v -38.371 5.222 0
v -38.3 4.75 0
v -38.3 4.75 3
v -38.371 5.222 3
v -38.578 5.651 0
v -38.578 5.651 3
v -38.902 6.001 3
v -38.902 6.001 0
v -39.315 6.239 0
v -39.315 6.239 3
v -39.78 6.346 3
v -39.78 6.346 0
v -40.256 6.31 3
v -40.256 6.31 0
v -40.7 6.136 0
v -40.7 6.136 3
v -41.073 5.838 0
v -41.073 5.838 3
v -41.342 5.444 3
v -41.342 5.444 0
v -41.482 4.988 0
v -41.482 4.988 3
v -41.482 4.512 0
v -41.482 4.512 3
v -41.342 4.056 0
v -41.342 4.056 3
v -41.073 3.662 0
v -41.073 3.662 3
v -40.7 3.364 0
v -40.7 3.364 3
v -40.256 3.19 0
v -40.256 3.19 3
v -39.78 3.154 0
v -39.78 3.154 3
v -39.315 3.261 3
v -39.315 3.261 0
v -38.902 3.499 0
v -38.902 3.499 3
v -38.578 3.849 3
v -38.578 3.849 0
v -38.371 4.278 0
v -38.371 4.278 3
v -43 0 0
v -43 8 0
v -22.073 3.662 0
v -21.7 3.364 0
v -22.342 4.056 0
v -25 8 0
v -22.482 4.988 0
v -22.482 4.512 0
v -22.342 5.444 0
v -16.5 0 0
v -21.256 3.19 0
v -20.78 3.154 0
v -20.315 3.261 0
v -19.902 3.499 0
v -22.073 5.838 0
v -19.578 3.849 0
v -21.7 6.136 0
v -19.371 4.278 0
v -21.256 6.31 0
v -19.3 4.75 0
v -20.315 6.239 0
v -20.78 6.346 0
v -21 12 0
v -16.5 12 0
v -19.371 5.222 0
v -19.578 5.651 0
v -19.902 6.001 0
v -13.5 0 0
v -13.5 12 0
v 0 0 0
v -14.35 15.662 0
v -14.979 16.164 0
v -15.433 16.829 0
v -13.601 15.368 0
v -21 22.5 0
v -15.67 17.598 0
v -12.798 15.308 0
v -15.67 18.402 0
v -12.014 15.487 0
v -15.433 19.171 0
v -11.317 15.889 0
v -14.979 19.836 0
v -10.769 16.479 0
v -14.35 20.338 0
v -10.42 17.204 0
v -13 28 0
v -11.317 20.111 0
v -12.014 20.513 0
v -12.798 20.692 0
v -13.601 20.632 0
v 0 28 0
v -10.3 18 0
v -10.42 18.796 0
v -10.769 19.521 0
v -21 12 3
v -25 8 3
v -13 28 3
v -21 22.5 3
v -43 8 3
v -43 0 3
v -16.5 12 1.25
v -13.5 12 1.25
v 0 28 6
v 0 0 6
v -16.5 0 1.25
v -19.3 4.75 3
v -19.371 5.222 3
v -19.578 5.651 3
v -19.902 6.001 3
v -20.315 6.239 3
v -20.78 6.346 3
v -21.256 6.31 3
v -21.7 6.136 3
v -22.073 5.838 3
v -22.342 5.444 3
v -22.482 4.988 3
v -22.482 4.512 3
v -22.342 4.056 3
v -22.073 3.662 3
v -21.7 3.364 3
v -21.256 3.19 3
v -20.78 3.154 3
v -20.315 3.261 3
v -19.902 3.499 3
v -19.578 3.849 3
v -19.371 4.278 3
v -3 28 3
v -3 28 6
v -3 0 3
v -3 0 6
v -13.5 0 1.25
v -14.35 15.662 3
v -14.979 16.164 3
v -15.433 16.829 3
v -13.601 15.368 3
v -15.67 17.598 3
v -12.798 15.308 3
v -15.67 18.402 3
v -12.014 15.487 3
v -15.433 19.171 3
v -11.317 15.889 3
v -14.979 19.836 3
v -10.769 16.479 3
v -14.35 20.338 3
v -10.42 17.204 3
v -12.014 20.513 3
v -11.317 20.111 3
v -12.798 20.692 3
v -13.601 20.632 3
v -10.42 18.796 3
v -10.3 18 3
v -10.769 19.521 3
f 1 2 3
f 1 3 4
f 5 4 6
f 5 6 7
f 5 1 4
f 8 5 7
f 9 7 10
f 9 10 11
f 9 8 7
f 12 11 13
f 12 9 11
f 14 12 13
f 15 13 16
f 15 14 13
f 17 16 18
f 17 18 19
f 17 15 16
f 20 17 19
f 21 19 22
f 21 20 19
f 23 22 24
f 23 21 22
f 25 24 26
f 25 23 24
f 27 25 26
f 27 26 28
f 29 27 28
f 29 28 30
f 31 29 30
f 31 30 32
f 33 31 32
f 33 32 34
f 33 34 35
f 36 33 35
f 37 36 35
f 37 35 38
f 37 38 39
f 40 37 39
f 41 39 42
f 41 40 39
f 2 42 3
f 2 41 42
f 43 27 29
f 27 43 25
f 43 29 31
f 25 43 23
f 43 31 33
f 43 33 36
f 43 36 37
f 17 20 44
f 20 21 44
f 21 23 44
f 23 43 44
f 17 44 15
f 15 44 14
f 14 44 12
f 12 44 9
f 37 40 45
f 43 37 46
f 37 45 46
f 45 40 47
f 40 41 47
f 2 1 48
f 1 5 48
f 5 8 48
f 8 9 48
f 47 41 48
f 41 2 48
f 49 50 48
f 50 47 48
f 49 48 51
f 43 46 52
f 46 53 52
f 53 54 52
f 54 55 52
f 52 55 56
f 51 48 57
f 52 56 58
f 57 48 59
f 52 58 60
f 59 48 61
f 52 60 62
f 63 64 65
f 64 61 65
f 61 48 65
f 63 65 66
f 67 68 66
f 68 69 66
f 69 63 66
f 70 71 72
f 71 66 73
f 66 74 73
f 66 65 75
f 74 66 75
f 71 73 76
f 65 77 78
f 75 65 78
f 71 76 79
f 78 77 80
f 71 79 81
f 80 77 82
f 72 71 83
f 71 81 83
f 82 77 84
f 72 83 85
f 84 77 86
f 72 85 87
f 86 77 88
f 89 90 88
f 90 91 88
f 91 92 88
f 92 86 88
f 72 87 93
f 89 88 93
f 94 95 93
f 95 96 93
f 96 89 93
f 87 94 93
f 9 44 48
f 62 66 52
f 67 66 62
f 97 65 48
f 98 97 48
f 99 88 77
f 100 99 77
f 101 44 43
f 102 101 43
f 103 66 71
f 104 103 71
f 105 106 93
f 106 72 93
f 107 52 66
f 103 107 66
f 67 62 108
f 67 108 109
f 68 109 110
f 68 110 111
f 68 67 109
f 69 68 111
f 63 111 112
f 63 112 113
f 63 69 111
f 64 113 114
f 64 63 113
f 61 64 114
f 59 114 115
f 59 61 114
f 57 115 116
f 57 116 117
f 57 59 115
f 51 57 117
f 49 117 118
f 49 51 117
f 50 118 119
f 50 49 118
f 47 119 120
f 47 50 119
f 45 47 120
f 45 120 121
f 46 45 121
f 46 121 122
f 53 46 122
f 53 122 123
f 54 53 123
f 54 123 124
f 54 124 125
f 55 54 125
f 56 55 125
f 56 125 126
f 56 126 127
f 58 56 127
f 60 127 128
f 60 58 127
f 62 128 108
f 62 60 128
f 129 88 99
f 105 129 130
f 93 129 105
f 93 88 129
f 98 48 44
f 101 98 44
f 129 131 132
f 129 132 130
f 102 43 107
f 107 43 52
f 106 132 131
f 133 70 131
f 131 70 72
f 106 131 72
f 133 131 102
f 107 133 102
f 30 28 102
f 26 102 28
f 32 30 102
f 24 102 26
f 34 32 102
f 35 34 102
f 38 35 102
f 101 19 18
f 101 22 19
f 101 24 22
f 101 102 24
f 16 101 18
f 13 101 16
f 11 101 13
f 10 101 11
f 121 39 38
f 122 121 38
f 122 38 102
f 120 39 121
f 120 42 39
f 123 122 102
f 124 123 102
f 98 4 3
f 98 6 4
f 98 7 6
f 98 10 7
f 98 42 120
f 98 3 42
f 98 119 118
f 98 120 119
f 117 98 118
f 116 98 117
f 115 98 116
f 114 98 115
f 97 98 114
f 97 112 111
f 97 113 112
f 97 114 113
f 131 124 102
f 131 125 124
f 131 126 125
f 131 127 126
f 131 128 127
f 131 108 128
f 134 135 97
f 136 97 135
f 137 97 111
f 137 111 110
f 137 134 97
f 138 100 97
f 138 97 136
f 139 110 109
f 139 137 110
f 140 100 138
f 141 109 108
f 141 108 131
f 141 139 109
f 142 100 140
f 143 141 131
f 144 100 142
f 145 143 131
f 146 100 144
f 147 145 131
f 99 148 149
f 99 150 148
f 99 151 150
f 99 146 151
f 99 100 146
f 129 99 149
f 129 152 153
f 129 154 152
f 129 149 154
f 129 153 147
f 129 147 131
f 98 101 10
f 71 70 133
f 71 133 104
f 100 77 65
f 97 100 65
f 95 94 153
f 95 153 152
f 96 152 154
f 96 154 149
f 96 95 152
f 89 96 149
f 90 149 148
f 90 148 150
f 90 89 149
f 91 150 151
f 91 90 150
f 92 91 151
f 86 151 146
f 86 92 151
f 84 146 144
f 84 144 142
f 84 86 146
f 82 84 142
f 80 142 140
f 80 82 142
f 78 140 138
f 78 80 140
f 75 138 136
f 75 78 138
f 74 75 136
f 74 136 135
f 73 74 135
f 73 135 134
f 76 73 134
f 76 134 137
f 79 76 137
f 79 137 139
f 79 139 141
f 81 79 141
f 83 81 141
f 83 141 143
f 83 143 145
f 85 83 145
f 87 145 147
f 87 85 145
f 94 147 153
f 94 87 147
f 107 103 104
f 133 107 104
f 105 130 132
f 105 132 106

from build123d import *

# Parameters (mm, degrees)
SKETCH1_R           = 1.6
SKETCH1_R_2         = 2.7
BOSS_EXTRUDE1_DEPTH = 3
BOSS_EXTRUDE2_START = 3
SKETCH1_3_W         = 3
SKETCH1_3_H         = 28
BOSS_EXTRUDE2_DEPTH = 3
SKETCH1_5_W         = 3
SKETCH1_5_H         = 12
CUT_EXTRUDE2_DEPTH  = 1.25


with BuildPart() as part:
    # Sketch1 → Boss-Extrude1 (new body)
    with BuildSketch(Plane.XY):
        Polygon((0, 0), (0, 28), (-13, 28), (-21, 22.5), (-21, 12), (-25, 8), (-43, 8), (-43, 0), align=None)
        with Locations((-39.9, 4.75)):
            Circle(SKETCH1_R, mode=Mode.SUBTRACT)
        with Locations((-13, 18)):
            Circle(SKETCH1_R_2, mode=Mode.SUBTRACT)
        with Locations((-20.9, 4.75)):
            Circle(SKETCH1_R, mode=Mode.SUBTRACT)
    extrude(amount=BOSS_EXTRUDE1_DEPTH)

    # Sketch1<3> → Boss-Extrude2 (add)
    with BuildSketch(Plane.XY.offset(BOSS_EXTRUDE2_START)):
        with Locations((-1.5, 14)):
            Rectangle(SKETCH1_3_W, SKETCH1_3_H)
    extrude(amount=BOSS_EXTRUDE2_DEPTH)

    # Sketch1<5> → Cut-Extrude2 (cut)
    with BuildSketch(Plane.XY):
        with Locations((-15, 6)):
            Rectangle(SKETCH1_5_W, SKETCH1_5_H)
    extrude(amount=CUT_EXTRUDE2_DEPTH, mode=Mode.SUBTRACT)


solid = part.part
